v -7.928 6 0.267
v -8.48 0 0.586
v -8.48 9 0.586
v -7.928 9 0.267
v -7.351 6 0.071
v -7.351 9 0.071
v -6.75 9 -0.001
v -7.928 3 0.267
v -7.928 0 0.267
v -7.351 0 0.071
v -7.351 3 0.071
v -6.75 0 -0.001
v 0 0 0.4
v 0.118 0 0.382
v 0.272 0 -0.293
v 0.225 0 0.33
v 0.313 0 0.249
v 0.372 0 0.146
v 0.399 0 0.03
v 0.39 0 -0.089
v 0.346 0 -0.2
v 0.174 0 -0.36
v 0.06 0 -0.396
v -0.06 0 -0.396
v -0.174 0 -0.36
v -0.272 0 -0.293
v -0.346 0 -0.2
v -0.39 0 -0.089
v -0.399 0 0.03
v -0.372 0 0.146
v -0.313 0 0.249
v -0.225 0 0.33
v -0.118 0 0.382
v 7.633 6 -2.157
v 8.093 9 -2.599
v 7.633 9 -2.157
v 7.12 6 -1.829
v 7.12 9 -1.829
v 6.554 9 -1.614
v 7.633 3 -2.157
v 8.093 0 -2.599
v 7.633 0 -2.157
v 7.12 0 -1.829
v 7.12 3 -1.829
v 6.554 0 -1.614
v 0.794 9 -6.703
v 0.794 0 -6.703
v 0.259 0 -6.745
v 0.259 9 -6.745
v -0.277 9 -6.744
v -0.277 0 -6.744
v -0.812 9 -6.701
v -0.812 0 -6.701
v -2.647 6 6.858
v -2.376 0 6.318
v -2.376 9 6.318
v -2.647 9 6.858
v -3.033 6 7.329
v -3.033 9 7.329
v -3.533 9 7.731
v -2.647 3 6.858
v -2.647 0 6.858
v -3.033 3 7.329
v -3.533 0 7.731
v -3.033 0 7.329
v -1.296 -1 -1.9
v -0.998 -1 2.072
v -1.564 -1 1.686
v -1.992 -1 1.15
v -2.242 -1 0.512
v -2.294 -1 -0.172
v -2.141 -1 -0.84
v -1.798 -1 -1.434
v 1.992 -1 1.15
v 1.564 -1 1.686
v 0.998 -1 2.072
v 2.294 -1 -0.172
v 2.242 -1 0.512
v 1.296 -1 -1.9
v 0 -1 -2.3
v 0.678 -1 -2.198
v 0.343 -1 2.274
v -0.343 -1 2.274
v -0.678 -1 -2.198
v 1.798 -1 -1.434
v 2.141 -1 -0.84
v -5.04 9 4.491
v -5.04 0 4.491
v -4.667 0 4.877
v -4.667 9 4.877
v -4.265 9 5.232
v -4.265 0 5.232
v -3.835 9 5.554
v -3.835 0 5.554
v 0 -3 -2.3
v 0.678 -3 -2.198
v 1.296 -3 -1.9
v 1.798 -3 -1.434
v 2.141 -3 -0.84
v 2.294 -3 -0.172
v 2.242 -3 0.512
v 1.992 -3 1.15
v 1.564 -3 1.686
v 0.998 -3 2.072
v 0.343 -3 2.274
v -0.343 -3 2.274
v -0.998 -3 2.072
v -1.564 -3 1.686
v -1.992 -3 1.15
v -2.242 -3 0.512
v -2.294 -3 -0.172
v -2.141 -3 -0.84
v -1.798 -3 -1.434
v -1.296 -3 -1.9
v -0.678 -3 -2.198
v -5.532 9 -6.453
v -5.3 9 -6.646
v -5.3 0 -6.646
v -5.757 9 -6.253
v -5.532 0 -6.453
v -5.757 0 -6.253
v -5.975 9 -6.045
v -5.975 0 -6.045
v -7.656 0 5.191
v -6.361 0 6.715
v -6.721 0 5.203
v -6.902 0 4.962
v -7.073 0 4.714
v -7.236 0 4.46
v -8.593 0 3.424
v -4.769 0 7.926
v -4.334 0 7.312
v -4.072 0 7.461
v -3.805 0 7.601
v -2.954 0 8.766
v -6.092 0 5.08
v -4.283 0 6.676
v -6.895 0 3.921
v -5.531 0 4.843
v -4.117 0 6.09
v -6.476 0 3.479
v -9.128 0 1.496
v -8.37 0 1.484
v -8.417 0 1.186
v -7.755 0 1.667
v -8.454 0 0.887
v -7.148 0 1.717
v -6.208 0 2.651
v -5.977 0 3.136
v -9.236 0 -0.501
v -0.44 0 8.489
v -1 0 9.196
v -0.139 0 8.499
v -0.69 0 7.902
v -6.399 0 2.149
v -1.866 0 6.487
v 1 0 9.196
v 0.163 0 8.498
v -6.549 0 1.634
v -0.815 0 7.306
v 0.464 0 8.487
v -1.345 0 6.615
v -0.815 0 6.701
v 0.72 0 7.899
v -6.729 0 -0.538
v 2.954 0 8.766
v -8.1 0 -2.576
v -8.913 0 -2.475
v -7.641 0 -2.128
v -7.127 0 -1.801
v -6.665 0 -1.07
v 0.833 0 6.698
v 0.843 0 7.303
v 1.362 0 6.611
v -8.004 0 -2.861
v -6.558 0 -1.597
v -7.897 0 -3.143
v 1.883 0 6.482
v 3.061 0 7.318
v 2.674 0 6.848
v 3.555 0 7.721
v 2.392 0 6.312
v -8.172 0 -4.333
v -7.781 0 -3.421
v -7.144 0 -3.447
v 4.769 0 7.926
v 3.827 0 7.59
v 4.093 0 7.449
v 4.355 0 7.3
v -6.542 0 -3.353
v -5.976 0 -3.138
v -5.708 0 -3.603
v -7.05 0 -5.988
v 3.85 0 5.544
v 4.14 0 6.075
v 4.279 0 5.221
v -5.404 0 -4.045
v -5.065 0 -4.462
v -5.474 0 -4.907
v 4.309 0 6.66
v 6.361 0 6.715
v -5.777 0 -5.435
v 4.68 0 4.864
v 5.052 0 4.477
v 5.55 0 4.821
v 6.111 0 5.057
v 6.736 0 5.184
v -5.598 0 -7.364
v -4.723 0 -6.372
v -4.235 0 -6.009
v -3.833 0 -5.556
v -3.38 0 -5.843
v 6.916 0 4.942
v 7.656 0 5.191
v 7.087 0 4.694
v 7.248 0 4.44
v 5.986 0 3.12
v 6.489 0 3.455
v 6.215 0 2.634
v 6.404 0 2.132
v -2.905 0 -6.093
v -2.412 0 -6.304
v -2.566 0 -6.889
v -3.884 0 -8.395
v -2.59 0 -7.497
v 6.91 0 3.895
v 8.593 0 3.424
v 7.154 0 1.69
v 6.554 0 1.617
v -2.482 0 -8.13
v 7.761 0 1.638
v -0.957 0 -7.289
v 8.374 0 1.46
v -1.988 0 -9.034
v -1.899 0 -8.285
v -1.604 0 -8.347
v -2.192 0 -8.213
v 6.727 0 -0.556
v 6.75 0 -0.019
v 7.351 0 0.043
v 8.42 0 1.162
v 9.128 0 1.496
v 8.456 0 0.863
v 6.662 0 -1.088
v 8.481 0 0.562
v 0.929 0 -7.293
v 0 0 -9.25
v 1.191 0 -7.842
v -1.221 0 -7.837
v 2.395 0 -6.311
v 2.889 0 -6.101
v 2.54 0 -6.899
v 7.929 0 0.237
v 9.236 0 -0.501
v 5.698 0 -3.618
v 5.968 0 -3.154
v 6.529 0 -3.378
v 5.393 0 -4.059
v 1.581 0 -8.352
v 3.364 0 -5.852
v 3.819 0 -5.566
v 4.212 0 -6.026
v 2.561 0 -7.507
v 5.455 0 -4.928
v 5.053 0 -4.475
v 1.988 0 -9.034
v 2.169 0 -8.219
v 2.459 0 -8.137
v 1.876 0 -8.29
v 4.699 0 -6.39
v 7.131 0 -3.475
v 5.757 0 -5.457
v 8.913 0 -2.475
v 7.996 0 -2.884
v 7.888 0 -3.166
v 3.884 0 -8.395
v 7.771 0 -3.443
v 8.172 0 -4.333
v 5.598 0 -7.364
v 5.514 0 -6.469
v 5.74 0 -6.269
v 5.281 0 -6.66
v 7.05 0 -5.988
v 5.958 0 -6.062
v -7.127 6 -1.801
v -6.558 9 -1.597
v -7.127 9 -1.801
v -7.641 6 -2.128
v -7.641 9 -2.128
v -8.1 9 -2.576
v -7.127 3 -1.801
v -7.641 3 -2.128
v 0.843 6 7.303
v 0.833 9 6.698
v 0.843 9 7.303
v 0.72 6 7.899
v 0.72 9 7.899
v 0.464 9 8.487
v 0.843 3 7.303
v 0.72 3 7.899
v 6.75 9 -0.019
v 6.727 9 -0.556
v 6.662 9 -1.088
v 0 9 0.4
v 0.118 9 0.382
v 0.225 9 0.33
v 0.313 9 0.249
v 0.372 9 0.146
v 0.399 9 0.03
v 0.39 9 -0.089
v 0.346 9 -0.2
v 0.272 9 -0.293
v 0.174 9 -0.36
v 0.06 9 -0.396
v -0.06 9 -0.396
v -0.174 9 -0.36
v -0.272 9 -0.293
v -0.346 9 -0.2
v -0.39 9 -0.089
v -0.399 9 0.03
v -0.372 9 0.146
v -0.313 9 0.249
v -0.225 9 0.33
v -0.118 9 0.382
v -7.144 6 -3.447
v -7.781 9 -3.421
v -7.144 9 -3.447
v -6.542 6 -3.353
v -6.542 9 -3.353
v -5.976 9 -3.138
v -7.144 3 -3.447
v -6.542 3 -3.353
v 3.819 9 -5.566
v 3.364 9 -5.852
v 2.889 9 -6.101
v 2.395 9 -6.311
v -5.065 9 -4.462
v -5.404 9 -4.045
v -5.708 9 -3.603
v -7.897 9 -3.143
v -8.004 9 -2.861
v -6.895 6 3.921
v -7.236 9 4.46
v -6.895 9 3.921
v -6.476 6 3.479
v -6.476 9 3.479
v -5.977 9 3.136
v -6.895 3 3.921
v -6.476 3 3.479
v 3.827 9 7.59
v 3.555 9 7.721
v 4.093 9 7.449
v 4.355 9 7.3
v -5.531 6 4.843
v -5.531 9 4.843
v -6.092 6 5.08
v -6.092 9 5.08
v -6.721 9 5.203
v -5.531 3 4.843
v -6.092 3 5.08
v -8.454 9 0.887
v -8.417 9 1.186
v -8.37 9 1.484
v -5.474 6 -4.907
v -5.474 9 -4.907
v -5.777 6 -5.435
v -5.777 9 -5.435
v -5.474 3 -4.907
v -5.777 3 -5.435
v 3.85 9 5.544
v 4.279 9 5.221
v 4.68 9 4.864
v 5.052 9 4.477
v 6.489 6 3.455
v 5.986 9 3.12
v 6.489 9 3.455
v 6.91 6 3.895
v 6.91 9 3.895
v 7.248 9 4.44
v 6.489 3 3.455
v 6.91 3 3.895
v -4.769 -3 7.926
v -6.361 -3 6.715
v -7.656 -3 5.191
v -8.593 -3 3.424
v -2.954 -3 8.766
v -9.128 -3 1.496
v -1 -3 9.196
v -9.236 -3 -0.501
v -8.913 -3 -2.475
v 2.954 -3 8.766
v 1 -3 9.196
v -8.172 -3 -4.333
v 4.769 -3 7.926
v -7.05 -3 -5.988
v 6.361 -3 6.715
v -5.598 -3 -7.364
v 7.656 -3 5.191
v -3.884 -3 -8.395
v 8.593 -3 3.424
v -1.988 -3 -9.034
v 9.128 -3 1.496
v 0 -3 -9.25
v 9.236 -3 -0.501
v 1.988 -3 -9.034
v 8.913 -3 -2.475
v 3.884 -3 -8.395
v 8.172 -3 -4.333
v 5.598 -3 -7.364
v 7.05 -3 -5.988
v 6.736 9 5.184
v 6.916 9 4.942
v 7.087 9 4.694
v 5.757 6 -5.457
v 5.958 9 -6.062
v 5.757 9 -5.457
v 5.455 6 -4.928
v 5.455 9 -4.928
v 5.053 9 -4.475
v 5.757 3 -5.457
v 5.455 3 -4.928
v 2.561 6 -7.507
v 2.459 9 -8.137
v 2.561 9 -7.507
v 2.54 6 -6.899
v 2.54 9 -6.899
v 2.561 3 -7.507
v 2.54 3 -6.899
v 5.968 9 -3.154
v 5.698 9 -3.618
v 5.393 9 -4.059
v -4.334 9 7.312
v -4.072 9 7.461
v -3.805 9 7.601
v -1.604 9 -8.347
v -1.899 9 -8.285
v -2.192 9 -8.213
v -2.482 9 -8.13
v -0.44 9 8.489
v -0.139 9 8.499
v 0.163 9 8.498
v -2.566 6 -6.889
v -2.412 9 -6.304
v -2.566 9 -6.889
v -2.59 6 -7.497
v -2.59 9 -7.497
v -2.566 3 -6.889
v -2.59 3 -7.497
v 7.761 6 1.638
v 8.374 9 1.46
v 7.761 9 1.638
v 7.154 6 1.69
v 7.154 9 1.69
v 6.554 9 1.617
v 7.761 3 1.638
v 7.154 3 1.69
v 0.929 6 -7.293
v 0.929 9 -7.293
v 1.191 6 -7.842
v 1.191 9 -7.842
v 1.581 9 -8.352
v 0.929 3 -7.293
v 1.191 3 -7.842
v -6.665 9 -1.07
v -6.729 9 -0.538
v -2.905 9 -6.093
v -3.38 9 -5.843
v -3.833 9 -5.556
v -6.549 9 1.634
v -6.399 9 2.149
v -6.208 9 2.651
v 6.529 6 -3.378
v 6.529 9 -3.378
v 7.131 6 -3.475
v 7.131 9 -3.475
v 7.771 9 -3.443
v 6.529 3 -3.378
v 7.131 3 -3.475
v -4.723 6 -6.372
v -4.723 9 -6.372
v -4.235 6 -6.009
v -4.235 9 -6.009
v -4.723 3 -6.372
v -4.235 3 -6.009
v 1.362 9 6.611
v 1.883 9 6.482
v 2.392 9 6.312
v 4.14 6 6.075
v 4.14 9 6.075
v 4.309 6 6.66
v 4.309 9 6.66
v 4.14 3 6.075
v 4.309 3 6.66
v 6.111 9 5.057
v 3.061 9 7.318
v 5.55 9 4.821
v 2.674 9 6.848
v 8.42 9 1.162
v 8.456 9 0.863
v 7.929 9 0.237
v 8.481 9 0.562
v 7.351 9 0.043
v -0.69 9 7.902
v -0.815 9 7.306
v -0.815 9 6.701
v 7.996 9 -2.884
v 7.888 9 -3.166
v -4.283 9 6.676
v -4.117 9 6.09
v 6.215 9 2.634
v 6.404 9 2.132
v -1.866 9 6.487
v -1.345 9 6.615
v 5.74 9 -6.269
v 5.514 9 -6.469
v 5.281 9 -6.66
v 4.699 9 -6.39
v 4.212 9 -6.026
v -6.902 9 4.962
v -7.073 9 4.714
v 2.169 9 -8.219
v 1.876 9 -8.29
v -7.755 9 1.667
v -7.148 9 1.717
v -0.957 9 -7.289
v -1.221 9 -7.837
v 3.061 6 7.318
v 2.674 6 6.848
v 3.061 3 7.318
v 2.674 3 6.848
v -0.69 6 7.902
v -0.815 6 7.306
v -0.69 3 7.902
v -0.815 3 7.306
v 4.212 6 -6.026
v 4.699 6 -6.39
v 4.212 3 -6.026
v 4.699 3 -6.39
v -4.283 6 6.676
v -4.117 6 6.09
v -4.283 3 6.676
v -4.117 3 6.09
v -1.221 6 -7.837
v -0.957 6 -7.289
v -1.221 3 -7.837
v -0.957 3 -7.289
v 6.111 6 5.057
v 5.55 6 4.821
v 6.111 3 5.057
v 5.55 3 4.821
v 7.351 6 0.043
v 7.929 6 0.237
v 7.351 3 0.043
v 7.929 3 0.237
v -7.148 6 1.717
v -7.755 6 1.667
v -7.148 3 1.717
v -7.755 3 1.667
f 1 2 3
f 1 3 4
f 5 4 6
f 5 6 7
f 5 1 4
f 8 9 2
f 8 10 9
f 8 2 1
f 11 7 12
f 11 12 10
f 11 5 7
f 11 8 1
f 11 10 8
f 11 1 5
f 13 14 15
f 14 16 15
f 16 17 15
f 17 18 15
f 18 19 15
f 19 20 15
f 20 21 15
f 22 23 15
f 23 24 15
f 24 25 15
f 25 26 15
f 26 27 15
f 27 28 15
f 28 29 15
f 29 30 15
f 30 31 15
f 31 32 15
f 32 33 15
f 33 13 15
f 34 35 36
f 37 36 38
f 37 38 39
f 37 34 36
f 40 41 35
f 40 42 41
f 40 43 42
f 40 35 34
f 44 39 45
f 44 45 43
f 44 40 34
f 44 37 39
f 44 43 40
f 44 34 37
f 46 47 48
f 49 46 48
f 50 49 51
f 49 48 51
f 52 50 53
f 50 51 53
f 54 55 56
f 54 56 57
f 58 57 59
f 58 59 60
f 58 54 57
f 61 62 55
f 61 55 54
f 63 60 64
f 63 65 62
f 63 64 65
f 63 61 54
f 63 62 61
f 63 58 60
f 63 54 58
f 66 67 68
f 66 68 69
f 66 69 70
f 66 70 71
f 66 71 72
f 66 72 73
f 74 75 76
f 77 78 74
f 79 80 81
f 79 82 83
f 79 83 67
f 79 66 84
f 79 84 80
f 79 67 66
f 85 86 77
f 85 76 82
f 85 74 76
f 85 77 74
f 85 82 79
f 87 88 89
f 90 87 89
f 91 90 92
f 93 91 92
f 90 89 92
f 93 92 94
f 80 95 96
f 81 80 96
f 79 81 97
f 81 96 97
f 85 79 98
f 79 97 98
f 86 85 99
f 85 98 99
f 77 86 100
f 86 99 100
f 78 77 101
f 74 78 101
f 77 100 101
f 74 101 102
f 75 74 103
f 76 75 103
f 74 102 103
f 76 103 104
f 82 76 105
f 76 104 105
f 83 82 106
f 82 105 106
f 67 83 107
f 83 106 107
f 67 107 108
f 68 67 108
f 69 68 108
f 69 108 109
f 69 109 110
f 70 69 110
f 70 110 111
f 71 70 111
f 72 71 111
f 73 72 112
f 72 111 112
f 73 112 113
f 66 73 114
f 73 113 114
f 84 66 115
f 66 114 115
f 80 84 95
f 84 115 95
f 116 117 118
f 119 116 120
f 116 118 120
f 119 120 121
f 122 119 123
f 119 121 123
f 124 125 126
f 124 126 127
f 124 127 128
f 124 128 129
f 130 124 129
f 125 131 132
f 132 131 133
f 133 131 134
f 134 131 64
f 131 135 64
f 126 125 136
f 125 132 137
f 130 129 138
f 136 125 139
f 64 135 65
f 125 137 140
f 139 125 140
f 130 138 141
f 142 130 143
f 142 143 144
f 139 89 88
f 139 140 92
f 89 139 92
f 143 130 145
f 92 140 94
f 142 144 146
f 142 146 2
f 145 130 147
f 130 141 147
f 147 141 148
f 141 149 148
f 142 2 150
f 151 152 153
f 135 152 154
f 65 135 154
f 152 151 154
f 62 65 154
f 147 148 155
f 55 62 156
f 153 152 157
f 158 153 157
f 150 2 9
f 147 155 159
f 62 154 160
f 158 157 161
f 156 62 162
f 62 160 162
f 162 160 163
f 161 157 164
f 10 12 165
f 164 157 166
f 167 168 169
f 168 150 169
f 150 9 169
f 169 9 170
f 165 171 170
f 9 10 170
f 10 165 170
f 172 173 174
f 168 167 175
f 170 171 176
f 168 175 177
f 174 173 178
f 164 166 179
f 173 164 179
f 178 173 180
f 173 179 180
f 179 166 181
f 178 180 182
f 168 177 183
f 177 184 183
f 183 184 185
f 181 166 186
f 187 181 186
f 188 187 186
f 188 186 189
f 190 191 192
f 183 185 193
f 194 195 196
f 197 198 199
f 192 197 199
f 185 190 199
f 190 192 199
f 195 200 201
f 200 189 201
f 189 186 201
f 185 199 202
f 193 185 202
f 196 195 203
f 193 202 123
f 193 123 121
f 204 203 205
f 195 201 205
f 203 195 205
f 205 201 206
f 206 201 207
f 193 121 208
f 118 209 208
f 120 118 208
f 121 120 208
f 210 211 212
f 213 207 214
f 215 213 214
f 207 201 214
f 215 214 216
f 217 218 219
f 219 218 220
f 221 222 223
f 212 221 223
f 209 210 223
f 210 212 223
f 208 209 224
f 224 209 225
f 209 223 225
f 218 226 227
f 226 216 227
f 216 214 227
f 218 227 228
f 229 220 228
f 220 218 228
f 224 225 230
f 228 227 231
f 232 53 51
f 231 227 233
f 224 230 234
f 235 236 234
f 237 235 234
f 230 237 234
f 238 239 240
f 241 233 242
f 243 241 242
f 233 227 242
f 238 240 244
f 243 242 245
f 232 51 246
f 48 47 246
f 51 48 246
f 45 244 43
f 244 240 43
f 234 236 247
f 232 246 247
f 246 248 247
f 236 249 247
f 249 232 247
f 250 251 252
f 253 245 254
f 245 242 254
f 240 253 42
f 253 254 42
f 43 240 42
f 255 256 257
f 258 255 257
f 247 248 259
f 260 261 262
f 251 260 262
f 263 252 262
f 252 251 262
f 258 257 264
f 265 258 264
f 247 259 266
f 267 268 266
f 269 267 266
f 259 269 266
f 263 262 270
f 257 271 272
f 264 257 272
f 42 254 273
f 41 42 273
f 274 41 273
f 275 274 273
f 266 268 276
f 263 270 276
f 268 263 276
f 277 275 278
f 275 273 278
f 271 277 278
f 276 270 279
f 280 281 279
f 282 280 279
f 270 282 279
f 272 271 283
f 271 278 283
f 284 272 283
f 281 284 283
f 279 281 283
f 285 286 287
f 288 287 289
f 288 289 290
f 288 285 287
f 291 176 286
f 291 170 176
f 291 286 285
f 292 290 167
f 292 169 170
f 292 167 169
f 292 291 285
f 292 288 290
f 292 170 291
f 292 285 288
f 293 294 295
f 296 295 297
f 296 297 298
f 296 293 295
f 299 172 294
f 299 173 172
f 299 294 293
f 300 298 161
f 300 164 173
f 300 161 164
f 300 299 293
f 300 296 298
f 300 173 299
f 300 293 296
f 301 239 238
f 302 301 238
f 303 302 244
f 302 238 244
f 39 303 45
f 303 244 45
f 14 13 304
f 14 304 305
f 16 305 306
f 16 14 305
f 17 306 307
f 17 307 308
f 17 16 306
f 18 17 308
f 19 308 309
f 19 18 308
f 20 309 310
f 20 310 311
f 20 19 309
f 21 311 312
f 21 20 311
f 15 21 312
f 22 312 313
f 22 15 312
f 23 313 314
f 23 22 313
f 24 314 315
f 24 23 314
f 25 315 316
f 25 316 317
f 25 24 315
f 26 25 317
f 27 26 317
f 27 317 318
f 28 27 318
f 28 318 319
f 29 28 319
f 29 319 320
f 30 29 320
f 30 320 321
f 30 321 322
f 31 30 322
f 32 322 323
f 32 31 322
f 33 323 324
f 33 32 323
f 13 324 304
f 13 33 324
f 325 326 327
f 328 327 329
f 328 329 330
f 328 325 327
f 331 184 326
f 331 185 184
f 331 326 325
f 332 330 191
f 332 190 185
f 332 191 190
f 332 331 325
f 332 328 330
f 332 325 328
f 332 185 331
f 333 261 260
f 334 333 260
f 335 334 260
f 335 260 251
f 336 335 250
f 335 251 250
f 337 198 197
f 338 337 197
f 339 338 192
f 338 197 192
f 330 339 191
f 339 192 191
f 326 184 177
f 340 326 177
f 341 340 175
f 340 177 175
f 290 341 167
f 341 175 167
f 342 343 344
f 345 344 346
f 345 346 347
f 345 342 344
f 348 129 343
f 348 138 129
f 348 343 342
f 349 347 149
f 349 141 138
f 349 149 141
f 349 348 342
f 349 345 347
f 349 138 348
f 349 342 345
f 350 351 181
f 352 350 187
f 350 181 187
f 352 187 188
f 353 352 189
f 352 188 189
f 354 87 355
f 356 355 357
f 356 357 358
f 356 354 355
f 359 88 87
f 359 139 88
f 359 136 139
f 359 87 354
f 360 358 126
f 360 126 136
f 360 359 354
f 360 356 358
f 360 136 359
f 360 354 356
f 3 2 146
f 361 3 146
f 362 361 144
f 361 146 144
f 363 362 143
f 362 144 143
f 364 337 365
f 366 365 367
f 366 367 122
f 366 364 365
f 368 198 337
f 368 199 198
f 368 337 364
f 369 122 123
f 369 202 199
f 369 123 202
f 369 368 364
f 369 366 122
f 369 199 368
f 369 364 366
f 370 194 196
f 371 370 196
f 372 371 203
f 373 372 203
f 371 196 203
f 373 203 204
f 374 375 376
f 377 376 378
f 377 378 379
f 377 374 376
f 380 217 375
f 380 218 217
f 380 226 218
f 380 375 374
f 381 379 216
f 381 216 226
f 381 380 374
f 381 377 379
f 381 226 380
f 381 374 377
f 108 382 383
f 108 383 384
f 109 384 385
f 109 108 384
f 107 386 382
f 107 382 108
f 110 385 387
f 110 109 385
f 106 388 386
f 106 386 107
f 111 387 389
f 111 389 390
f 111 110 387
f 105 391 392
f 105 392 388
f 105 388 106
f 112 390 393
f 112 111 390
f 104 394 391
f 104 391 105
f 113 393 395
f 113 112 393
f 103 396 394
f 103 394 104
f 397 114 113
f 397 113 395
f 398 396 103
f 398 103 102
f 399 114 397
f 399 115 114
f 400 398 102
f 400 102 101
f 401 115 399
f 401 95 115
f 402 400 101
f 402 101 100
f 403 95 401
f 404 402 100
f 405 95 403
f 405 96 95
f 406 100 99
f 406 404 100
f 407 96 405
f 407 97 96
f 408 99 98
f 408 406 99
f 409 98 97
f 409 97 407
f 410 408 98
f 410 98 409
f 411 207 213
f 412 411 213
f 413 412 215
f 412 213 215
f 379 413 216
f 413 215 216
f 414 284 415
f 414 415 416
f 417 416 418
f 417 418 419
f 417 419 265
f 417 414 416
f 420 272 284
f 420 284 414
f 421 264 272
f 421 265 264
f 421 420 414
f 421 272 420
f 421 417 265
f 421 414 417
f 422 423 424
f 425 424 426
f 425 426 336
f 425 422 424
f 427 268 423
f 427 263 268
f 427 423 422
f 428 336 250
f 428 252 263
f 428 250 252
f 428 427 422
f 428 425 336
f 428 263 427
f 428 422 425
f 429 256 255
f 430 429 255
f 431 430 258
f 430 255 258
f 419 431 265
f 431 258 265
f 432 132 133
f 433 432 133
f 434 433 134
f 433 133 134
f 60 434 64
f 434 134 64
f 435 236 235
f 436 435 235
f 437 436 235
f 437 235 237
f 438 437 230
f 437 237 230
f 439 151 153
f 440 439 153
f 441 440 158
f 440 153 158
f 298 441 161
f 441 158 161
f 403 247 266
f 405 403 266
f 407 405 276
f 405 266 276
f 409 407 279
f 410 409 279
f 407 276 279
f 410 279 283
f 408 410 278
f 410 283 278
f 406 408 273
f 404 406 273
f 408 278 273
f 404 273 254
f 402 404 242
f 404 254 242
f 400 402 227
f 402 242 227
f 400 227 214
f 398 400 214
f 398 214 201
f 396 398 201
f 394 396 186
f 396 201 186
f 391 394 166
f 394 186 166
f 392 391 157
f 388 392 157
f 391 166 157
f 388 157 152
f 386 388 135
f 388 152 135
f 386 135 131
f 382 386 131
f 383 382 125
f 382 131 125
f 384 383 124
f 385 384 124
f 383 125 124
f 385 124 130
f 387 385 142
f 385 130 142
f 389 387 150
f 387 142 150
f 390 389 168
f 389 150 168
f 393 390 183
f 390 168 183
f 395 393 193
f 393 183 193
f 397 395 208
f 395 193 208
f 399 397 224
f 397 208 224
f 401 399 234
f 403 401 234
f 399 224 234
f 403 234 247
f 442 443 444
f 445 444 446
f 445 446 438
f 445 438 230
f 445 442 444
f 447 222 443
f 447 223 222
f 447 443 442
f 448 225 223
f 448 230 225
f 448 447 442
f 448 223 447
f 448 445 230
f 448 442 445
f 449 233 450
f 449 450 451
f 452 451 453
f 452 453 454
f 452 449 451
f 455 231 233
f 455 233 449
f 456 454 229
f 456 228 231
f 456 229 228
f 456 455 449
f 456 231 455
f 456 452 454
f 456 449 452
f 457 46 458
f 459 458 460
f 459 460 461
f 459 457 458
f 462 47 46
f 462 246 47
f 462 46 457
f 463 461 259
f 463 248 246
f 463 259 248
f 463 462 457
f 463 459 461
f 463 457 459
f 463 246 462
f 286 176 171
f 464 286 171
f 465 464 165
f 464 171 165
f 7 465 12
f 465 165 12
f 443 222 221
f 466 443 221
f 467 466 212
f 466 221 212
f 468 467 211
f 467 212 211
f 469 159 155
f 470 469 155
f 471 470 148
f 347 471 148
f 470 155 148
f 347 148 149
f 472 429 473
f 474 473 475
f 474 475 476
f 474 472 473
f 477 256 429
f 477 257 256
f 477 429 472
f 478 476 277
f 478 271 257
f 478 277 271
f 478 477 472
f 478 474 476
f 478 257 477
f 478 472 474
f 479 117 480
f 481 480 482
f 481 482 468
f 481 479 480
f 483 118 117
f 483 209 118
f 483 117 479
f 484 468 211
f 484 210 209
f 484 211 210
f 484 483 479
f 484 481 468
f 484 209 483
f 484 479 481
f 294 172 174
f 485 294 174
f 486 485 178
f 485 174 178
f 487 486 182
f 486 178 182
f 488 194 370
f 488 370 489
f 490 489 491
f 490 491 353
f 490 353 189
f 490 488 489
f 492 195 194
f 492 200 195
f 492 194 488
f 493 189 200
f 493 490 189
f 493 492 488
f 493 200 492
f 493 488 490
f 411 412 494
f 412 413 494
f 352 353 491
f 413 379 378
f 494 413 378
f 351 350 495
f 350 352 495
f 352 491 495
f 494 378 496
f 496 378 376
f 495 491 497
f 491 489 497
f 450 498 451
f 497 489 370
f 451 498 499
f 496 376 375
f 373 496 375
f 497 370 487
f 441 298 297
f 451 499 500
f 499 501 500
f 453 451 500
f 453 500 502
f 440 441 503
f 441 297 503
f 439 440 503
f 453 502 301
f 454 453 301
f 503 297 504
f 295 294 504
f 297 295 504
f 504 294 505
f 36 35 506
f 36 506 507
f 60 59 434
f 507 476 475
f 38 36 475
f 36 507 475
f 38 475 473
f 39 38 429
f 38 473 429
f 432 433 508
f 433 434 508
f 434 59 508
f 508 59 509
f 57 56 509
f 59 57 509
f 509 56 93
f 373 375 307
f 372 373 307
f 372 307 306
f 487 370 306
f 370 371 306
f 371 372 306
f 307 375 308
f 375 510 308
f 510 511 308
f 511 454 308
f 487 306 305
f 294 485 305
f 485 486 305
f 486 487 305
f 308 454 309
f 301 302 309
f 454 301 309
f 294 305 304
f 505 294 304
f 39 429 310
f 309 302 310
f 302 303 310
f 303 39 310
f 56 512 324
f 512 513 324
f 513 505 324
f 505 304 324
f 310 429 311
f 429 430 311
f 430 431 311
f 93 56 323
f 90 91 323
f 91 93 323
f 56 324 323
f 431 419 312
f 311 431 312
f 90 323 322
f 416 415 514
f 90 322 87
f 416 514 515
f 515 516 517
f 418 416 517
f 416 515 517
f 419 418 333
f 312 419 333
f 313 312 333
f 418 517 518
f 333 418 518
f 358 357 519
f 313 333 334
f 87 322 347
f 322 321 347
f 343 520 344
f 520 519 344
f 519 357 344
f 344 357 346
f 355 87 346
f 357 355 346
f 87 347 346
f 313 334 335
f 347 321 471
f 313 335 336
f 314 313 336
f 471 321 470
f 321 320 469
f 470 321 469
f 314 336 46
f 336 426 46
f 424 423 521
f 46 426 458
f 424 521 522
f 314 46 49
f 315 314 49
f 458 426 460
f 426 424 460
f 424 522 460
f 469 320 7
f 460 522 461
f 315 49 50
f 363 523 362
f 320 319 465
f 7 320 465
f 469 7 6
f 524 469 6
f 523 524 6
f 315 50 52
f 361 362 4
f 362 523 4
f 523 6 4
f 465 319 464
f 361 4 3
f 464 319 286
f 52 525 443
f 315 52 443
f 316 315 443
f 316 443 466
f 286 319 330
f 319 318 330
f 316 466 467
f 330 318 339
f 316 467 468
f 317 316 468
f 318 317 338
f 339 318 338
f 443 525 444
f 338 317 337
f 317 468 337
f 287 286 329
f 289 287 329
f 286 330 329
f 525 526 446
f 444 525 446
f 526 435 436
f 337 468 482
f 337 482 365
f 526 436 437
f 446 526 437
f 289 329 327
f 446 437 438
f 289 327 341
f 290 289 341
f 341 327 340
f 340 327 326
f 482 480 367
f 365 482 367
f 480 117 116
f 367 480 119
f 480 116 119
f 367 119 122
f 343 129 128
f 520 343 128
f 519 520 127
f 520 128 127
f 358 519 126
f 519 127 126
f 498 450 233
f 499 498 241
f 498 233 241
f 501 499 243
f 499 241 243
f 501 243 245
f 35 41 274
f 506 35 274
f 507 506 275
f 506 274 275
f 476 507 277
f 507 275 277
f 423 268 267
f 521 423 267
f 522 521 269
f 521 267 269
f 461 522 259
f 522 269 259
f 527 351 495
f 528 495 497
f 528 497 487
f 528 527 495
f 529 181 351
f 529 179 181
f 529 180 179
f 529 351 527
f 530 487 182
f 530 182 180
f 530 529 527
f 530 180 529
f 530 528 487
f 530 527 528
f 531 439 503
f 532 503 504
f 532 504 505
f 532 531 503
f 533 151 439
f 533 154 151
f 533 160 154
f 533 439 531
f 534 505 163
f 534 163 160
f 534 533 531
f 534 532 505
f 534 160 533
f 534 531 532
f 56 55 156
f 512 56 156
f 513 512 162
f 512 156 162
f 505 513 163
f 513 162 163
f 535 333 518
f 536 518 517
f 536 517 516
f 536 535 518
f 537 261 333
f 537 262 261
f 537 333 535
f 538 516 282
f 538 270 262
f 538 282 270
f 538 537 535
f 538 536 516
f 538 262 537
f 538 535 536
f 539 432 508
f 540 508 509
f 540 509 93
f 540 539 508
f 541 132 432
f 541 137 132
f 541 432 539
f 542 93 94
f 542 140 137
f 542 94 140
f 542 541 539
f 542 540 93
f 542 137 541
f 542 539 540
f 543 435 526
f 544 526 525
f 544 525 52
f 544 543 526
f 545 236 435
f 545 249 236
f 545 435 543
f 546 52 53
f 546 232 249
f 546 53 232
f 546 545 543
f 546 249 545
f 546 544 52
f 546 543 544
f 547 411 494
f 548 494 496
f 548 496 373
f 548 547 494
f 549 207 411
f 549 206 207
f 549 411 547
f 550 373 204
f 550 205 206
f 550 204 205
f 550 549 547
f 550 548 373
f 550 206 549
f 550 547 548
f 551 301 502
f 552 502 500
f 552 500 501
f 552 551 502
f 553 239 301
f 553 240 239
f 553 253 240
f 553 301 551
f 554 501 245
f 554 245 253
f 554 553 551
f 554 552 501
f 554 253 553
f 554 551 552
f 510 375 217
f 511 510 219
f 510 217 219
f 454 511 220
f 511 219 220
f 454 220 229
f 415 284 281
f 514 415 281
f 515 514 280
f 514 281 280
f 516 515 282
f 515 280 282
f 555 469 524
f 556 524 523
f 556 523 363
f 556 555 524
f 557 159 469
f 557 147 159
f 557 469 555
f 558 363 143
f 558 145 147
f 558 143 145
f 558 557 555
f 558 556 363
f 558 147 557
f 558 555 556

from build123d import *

# Parameters (mm, degrees)
SKETCH1_R             = 0.4
BOSS_EXTRUDE1_DEPTH   = 9
SKETCH2_R             = 9.25
BOSS_EXTRUDE2_DEPTH   = 3
CROQUIS1_R            = 2.3
CORTAR_EXTRUIR1_DEPTH = 2


with BuildPart() as part:
    # Sketch1 → Boss-Extrude1 (new body)
    with BuildSketch(Plane(origin=(0, 0, 0), x_dir=(1, 0, 0), z_dir=(0, 1, 0))):
        with BuildLine():
            add(Edge.make_bspline(
                [(-5.065227978, 4.461610195), (-5.526615005, 4.86619147), (-5.830003112, 5.39406146), (-5.975392301, 6.045220165)],
                knots=[0, 0, 0, 0, 0.872429449, 0.872429449, 0.872429449, 0.872429449], degree=3))
            ThreePointArc((-5.065227978, 4.461610195), (-5.560258819, 3.827012132), (-5.976238464, 3.138004752))
            add(Edge.make_bspline(
                [(-7.780961116, 3.42149735), (-7.125870497, 3.507536778), (-6.52429628, 3.413039245), (-5.976238464, 3.138004752)],
                knots=[0.127683247, 0.127683247, 0.127683247, 0.127683247, 1, 1, 1, 1], degree=3))
            ThreePointArc((-7.780961116, 3.42149735), (-7.951879756, 3.00293329), (-8.10030101, 2.575873357))
            add(Edge.make_bspline(
                [(-6.558450277, 1.596630818), (-7.155006493, 1.740452504), (-7.668956737, 2.066866683), (-8.10030101, 2.575873357)],
                knots=[0, 0, 0, 0, 0.872429449, 0.872429449, 0.872429449, 0.872429449], degree=3))
            ThreePointArc((-6.558450277, 1.596630818), (-6.701865893, 0.804669837), (-6.749999881, 0.00126872))
            add(Edge.make_bspline(
                [(-8.479748007, -0.586407486), (-7.939678588, -0.205787566), (-7.363095879, -0.009895497), (-6.749999881, 0.00126872)],
                knots=[0.127683247, 0.127683247, 0.127683247, 0.127683247, 1, 1, 1, 1], degree=3))
            ThreePointArc((-8.479748007, -0.586407486), (-8.436572529, -1.036457408), (-8.369528376, -1.483574994))
            add(Edge.make_bspline(
                [(-6.549210655, -1.634117437), (-7.144272221, -1.784003157), (-7.751044795, -1.733822342), (-8.369528376, -1.483574994)],
                knots=[0, 0, 0, 0, 0.872429449, 0.872429449, 0.872429449, 0.872429449], degree=3))
            ThreePointArc((-6.549210655, -1.634117437), (-6.308156258, -2.402012621), (-5.977417671, -3.13575796))
            add(Edge.make_bspline(
                [(-7.235926822, -4.459973434), (-6.934601997, -3.871968458), (-6.515098947, -3.4305633), (-5.977417671, -3.13575796)],
                knots=[0.127683247, 0.127683247, 0.127683247, 0.127683247, 1, 1, 1, 1], degree=3))
            ThreePointArc((-7.235926822, -4.459973434), (-6.988548208, -4.838408204), (-6.721397655, -5.203154193))
            add(Edge.make_bspline(
                [(-5.039625799, -4.490509081), (-5.496871281, -4.899765193), (-6.0574619, -5.137313564), (-6.721397655, -5.203154193)],
                knots=[0, 0, 0, 0, 0.872429449, 0.872429449, 0.872429449, 0.872429449], degree=3))
            ThreePointArc((-5.039625799, -4.490509081), (-4.469324045, -5.058422935), (-3.835481109, -5.554420281))
            add(Edge.make_bspline(
                [(-4.334442004, -7.311813216), (-4.34089166, -6.651128039), (-4.174571361, -6.065330394), (-3.835481109, -5.554420281)],
                knots=[0.127683247, 0.127683247, 0.127683247, 0.127683247, 1, 1, 1, 1], degree=3))
            ThreePointArc((-4.334442004, -7.311813216), (-3.939531713, -7.53193799), (-3.533475733, -7.730753472))
            add(Edge.make_bspline(
                [(-2.375523406, -6.318179211), (-2.590203375, -6.893050073), (-2.976187484, -7.36390816), (-3.533475733, -7.730753472)],
                knots=[0, 0, 0, 0, 0.872429449, 0.872429449, 0.872429449, 0.872429449], degree=3))
            ThreePointArc((-2.375523406, -6.318179211), (-1.606623554, -6.556009515), (-0.814882047, -6.700631854))
            add(Edge.make_bspline(
                [(-0.439988759, -8.488604708), (-0.752735357, -7.906594341), (-0.877699786, -7.31060339), (-0.814882047, -6.700631854)],
                knots=[0.127683247, 0.127683247, 0.127683247, 0.127683247, 1, 1, 1, 1], degree=3))
            ThreePointArc((-0.439988759, -8.488604708), (0.011984021, -8.499991552), (0.463922896, -8.487330296))
            add(Edge.make_bspline(
                [(0.832782771, -6.698430626), (0.909848909, -7.307220251), (0.786895617, -7.903520141), (0.463922896, -8.487330296)],
                knots=[0, 0, 0, 0, 0.872429449, 0.872429449, 0.872429449, 0.872429449], degree=3))
            ThreePointArc((0.832782771, -6.698430626), (1.624135031, -6.551693323), (2.392396671, -6.311809421))
            add(Edge.make_bspline(
                [(3.555260608, -7.72075916), (3.007863545, -7.350755165), (2.620242233, -6.881105252), (2.392396671, -6.311809421)],
                knots=[0.127683247, 0.127683247, 0.127683247, 0.127683247, 1, 1, 1, 1], degree=3))
            ThreePointArc((3.555260608, -7.72075916), (3.96075436, -7.520799485), (4.355042381, -7.299562032))
            add(Edge.make_bspline(
                [(3.850308451, -5.54415231), (4.201465773, -6.047394331), (4.369710416, -6.632530905), (4.355042381, -7.299562032)],
                knots=[0, 0, 0, 0, 0.872429449, 0.872429449, 0.872429449, 0.872429449], degree=3))
            ThreePointArc((3.850308451, -5.54415231), (4.482823853, -5.046463148), (5.051606144, -4.477027515))
            add(Edge.make_bspline(
                [(6.736042616, -5.184180734), (6.079397157, -5.110946566), (5.517918333, -4.875228826), (5.051606144, -4.477027515)],
                knots=[0.127683247, 0.127683247, 0.127683247, 0.127683247, 1, 1, 1, 1], degree=3))
            ThreePointArc((6.736042616, -5.184180734), (7.002163607, -4.818682892), (7.24847414, -4.439552076))
            add(Edge.make_bspline(
                [(5.985774866, -3.119775513), (6.530577461, -3.402183249), (6.951477219, -3.84210877), (7.24847414, -4.439552076)],
                knots=[0, 0, 0, 0, 0.872429449, 0.872429449, 0.872429449, 0.872429449], degree=3))
            ThreePointArc((5.985774866, -3.119775513), (6.314551754, -2.385149082), (6.553553527, -1.616612559))
            add(Edge.make_bspline(
                [(8.373678438, -1.459968977), (7.758214146, -1.700281702), (7.151505842, -1.75249623), (6.553553527, -1.616612559)],
                knots=[0.127683247, 0.127683247, 0.127683247, 0.127683247, 1, 1, 1, 1], degree=3))
            ThreePointArc((8.373678438, -1.459968977), (8.439461558, -1.01266412), (8.481367828, -0.562494242))
            add(Edge.make_bspline(
                [(6.749972396, 0.019304256), (7.363612555, 0.022427015), (7.940744366, -0.171505818), (8.481367828, -0.562494242)],
                knots=[0, 0, 0, 0, 0.872429449, 0.872429449, 0.872429449, 0.872429449], degree=3))
            ThreePointArc((6.749972396, 0.019304256), (6.699691947, 0.822573894), (6.554160776, 1.614148852))
            add(Edge.make_bspline(
                [(8.093005444, 2.598704077), (7.65971777, 2.099897208), (7.146769547, 1.771712133), (6.554160776, 1.614148852)],
                knots=[0.127683247, 0.127683247, 0.127683247, 0.127683247, 1, 1, 1, 1], degree=3))
            ThreePointArc((8.093005444, 2.598704077), (7.943380571, 3.025343799), (7.771282357, 3.443424244))
            add(Edge.make_bspline(
                [(5.967832596, 3.153961653), (6.509732754, 3.44189952), (7.110882674, 3.53838705), (7.771282357, 3.443424244)],
                knots=[0, 0, 0, 0, 0.872429449, 0.872429449, 0.872429449, 0.872429449], degree=3))
            ThreePointArc((5.967832596, 3.153961653), (5.550013455, 3.841855105), (5.053288778, 4.475128213))
            add(Edge.make_bspline(
                [(5.958322434, 6.062045345), (5.806472362, 5.419014975), (5.504794477, 4.890042598), (5.053288778, 4.475128213)],
                knots=[0.127683247, 0.127683247, 0.127683247, 0.127683247, 1, 1, 1, 1], degree=3))
            ThreePointArc((5.958322434, 6.062045345), (5.627566824, 6.370281912), (5.280889753, 6.660495734))
            add(Edge.make_bspline(
                [(3.818534268, 5.566084444), (4.16455163, 6.072874324), (4.652003458, 6.437678087), (5.280889753, 6.660495734)],
                knots=[0, 0, 0, 0, 0.872429449, 0.872429449, 0.872429449, 0.872429449], degree=3))
            ThreePointArc((3.818534268, 5.566084444), (3.128893766, 5.98101361), (2.394769219, 6.310909632))
            add(Edge.make_bspline(
                [(2.45865956, 8.136645081), (2.623034112, 7.496701718), (2.601737332, 6.888123235), (2.394769219, 6.310909632)],
                knots=[0.127683247, 0.127683247, 0.127683247, 0.127683247, 1, 1, 1, 1], degree=3))
            ThreePointArc((2.45865956, 8.136645081), (2.022545337, 8.25586521), (1.580708948, 8.351727918))
            add(Edge.make_bspline(
                [(0.794455758, 6.703084368), (0.865321915, 7.312626807), (1.127406312, 7.862174657), (1.580708948, 8.351727918)],
                knots=[0, 0, 0, 0, 0.872429449, 0.872429449, 0.872429449, 0.872429449], degree=3))
            ThreePointArc((0.794455758, 6.703084368), (-0.009017778, 6.749993976), (-0.812363108, 6.700937709))
            add(Edge.make_bspline(
                [(-1.604252589, 8.347237485), (-1.161309642, 7.856984441), (-0.897346481, 7.308217849), (-0.812363108, 6.700937709)],
                knots=[0.127683247, 0.127683247, 0.127683247, 0.127683247, 1, 1, 1, 1], degree=3))
            ThreePointArc((-1.604252589, 8.347237485), (-2.045816912, 8.250129282), (-2.481593228, 8.129679886))
            add(Edge.make_bspline(
                [(-2.411622992, 6.304488444), (-2.632142622, 6.877144615), (-2.655466033, 7.485541762), (-2.481593228, 8.129679886)],
                knots=[0, 0, 0, 0, 0.872429449, 0.872429449, 0.872429449, 0.872429449], degree=3))
            ThreePointArc((-2.411622992, 6.304488444), (-3.144863458, 5.972632069), (-3.833392837, 5.555861712))
            add(Edge.make_bspline(
                [(-5.299649804, 6.645578377), (-4.679611352, 6.417326717), (-4.19085903, 6.054087828), (-3.833392837, 5.555861712)],
                knots=[0.127683247, 0.127683247, 0.127683247, 0.127683247, 1, 1, 1, 1], degree=3))
            ThreePointArc((-5.299649804, 6.645578377), (-5.645507162, 6.35438816), (-5.975392301, 6.045220165))
        make_face()
        with Locations(Location((0, 0, 0), (0, 0, 270))):
            Circle(SKETCH1_R, mode=Mode.SUBTRACT)
    extrude(amount=BOSS_EXTRUDE1_DEPTH)

    # Sketch2 → Boss-Extrude2 (add)
    with BuildSketch(Plane.XZ):
        with Locations(Location((0, 0, 0), (0, 0, 270))):
            Circle(SKETCH2_R)
    extrude(amount=BOSS_EXTRUDE2_DEPTH)

    # Croquis1 → Cortar-Extruir1 (cut)
    with BuildSketch(Plane.XZ.offset(3)):
        with Locations(Location((0, 0, 0), (0, 0, 270))):
            Circle(CROQUIS1_R)
    extrude(amount=-CORTAR_EXTRUIR1_DEPTH, mode=Mode.SUBTRACT)


solid = part.part
